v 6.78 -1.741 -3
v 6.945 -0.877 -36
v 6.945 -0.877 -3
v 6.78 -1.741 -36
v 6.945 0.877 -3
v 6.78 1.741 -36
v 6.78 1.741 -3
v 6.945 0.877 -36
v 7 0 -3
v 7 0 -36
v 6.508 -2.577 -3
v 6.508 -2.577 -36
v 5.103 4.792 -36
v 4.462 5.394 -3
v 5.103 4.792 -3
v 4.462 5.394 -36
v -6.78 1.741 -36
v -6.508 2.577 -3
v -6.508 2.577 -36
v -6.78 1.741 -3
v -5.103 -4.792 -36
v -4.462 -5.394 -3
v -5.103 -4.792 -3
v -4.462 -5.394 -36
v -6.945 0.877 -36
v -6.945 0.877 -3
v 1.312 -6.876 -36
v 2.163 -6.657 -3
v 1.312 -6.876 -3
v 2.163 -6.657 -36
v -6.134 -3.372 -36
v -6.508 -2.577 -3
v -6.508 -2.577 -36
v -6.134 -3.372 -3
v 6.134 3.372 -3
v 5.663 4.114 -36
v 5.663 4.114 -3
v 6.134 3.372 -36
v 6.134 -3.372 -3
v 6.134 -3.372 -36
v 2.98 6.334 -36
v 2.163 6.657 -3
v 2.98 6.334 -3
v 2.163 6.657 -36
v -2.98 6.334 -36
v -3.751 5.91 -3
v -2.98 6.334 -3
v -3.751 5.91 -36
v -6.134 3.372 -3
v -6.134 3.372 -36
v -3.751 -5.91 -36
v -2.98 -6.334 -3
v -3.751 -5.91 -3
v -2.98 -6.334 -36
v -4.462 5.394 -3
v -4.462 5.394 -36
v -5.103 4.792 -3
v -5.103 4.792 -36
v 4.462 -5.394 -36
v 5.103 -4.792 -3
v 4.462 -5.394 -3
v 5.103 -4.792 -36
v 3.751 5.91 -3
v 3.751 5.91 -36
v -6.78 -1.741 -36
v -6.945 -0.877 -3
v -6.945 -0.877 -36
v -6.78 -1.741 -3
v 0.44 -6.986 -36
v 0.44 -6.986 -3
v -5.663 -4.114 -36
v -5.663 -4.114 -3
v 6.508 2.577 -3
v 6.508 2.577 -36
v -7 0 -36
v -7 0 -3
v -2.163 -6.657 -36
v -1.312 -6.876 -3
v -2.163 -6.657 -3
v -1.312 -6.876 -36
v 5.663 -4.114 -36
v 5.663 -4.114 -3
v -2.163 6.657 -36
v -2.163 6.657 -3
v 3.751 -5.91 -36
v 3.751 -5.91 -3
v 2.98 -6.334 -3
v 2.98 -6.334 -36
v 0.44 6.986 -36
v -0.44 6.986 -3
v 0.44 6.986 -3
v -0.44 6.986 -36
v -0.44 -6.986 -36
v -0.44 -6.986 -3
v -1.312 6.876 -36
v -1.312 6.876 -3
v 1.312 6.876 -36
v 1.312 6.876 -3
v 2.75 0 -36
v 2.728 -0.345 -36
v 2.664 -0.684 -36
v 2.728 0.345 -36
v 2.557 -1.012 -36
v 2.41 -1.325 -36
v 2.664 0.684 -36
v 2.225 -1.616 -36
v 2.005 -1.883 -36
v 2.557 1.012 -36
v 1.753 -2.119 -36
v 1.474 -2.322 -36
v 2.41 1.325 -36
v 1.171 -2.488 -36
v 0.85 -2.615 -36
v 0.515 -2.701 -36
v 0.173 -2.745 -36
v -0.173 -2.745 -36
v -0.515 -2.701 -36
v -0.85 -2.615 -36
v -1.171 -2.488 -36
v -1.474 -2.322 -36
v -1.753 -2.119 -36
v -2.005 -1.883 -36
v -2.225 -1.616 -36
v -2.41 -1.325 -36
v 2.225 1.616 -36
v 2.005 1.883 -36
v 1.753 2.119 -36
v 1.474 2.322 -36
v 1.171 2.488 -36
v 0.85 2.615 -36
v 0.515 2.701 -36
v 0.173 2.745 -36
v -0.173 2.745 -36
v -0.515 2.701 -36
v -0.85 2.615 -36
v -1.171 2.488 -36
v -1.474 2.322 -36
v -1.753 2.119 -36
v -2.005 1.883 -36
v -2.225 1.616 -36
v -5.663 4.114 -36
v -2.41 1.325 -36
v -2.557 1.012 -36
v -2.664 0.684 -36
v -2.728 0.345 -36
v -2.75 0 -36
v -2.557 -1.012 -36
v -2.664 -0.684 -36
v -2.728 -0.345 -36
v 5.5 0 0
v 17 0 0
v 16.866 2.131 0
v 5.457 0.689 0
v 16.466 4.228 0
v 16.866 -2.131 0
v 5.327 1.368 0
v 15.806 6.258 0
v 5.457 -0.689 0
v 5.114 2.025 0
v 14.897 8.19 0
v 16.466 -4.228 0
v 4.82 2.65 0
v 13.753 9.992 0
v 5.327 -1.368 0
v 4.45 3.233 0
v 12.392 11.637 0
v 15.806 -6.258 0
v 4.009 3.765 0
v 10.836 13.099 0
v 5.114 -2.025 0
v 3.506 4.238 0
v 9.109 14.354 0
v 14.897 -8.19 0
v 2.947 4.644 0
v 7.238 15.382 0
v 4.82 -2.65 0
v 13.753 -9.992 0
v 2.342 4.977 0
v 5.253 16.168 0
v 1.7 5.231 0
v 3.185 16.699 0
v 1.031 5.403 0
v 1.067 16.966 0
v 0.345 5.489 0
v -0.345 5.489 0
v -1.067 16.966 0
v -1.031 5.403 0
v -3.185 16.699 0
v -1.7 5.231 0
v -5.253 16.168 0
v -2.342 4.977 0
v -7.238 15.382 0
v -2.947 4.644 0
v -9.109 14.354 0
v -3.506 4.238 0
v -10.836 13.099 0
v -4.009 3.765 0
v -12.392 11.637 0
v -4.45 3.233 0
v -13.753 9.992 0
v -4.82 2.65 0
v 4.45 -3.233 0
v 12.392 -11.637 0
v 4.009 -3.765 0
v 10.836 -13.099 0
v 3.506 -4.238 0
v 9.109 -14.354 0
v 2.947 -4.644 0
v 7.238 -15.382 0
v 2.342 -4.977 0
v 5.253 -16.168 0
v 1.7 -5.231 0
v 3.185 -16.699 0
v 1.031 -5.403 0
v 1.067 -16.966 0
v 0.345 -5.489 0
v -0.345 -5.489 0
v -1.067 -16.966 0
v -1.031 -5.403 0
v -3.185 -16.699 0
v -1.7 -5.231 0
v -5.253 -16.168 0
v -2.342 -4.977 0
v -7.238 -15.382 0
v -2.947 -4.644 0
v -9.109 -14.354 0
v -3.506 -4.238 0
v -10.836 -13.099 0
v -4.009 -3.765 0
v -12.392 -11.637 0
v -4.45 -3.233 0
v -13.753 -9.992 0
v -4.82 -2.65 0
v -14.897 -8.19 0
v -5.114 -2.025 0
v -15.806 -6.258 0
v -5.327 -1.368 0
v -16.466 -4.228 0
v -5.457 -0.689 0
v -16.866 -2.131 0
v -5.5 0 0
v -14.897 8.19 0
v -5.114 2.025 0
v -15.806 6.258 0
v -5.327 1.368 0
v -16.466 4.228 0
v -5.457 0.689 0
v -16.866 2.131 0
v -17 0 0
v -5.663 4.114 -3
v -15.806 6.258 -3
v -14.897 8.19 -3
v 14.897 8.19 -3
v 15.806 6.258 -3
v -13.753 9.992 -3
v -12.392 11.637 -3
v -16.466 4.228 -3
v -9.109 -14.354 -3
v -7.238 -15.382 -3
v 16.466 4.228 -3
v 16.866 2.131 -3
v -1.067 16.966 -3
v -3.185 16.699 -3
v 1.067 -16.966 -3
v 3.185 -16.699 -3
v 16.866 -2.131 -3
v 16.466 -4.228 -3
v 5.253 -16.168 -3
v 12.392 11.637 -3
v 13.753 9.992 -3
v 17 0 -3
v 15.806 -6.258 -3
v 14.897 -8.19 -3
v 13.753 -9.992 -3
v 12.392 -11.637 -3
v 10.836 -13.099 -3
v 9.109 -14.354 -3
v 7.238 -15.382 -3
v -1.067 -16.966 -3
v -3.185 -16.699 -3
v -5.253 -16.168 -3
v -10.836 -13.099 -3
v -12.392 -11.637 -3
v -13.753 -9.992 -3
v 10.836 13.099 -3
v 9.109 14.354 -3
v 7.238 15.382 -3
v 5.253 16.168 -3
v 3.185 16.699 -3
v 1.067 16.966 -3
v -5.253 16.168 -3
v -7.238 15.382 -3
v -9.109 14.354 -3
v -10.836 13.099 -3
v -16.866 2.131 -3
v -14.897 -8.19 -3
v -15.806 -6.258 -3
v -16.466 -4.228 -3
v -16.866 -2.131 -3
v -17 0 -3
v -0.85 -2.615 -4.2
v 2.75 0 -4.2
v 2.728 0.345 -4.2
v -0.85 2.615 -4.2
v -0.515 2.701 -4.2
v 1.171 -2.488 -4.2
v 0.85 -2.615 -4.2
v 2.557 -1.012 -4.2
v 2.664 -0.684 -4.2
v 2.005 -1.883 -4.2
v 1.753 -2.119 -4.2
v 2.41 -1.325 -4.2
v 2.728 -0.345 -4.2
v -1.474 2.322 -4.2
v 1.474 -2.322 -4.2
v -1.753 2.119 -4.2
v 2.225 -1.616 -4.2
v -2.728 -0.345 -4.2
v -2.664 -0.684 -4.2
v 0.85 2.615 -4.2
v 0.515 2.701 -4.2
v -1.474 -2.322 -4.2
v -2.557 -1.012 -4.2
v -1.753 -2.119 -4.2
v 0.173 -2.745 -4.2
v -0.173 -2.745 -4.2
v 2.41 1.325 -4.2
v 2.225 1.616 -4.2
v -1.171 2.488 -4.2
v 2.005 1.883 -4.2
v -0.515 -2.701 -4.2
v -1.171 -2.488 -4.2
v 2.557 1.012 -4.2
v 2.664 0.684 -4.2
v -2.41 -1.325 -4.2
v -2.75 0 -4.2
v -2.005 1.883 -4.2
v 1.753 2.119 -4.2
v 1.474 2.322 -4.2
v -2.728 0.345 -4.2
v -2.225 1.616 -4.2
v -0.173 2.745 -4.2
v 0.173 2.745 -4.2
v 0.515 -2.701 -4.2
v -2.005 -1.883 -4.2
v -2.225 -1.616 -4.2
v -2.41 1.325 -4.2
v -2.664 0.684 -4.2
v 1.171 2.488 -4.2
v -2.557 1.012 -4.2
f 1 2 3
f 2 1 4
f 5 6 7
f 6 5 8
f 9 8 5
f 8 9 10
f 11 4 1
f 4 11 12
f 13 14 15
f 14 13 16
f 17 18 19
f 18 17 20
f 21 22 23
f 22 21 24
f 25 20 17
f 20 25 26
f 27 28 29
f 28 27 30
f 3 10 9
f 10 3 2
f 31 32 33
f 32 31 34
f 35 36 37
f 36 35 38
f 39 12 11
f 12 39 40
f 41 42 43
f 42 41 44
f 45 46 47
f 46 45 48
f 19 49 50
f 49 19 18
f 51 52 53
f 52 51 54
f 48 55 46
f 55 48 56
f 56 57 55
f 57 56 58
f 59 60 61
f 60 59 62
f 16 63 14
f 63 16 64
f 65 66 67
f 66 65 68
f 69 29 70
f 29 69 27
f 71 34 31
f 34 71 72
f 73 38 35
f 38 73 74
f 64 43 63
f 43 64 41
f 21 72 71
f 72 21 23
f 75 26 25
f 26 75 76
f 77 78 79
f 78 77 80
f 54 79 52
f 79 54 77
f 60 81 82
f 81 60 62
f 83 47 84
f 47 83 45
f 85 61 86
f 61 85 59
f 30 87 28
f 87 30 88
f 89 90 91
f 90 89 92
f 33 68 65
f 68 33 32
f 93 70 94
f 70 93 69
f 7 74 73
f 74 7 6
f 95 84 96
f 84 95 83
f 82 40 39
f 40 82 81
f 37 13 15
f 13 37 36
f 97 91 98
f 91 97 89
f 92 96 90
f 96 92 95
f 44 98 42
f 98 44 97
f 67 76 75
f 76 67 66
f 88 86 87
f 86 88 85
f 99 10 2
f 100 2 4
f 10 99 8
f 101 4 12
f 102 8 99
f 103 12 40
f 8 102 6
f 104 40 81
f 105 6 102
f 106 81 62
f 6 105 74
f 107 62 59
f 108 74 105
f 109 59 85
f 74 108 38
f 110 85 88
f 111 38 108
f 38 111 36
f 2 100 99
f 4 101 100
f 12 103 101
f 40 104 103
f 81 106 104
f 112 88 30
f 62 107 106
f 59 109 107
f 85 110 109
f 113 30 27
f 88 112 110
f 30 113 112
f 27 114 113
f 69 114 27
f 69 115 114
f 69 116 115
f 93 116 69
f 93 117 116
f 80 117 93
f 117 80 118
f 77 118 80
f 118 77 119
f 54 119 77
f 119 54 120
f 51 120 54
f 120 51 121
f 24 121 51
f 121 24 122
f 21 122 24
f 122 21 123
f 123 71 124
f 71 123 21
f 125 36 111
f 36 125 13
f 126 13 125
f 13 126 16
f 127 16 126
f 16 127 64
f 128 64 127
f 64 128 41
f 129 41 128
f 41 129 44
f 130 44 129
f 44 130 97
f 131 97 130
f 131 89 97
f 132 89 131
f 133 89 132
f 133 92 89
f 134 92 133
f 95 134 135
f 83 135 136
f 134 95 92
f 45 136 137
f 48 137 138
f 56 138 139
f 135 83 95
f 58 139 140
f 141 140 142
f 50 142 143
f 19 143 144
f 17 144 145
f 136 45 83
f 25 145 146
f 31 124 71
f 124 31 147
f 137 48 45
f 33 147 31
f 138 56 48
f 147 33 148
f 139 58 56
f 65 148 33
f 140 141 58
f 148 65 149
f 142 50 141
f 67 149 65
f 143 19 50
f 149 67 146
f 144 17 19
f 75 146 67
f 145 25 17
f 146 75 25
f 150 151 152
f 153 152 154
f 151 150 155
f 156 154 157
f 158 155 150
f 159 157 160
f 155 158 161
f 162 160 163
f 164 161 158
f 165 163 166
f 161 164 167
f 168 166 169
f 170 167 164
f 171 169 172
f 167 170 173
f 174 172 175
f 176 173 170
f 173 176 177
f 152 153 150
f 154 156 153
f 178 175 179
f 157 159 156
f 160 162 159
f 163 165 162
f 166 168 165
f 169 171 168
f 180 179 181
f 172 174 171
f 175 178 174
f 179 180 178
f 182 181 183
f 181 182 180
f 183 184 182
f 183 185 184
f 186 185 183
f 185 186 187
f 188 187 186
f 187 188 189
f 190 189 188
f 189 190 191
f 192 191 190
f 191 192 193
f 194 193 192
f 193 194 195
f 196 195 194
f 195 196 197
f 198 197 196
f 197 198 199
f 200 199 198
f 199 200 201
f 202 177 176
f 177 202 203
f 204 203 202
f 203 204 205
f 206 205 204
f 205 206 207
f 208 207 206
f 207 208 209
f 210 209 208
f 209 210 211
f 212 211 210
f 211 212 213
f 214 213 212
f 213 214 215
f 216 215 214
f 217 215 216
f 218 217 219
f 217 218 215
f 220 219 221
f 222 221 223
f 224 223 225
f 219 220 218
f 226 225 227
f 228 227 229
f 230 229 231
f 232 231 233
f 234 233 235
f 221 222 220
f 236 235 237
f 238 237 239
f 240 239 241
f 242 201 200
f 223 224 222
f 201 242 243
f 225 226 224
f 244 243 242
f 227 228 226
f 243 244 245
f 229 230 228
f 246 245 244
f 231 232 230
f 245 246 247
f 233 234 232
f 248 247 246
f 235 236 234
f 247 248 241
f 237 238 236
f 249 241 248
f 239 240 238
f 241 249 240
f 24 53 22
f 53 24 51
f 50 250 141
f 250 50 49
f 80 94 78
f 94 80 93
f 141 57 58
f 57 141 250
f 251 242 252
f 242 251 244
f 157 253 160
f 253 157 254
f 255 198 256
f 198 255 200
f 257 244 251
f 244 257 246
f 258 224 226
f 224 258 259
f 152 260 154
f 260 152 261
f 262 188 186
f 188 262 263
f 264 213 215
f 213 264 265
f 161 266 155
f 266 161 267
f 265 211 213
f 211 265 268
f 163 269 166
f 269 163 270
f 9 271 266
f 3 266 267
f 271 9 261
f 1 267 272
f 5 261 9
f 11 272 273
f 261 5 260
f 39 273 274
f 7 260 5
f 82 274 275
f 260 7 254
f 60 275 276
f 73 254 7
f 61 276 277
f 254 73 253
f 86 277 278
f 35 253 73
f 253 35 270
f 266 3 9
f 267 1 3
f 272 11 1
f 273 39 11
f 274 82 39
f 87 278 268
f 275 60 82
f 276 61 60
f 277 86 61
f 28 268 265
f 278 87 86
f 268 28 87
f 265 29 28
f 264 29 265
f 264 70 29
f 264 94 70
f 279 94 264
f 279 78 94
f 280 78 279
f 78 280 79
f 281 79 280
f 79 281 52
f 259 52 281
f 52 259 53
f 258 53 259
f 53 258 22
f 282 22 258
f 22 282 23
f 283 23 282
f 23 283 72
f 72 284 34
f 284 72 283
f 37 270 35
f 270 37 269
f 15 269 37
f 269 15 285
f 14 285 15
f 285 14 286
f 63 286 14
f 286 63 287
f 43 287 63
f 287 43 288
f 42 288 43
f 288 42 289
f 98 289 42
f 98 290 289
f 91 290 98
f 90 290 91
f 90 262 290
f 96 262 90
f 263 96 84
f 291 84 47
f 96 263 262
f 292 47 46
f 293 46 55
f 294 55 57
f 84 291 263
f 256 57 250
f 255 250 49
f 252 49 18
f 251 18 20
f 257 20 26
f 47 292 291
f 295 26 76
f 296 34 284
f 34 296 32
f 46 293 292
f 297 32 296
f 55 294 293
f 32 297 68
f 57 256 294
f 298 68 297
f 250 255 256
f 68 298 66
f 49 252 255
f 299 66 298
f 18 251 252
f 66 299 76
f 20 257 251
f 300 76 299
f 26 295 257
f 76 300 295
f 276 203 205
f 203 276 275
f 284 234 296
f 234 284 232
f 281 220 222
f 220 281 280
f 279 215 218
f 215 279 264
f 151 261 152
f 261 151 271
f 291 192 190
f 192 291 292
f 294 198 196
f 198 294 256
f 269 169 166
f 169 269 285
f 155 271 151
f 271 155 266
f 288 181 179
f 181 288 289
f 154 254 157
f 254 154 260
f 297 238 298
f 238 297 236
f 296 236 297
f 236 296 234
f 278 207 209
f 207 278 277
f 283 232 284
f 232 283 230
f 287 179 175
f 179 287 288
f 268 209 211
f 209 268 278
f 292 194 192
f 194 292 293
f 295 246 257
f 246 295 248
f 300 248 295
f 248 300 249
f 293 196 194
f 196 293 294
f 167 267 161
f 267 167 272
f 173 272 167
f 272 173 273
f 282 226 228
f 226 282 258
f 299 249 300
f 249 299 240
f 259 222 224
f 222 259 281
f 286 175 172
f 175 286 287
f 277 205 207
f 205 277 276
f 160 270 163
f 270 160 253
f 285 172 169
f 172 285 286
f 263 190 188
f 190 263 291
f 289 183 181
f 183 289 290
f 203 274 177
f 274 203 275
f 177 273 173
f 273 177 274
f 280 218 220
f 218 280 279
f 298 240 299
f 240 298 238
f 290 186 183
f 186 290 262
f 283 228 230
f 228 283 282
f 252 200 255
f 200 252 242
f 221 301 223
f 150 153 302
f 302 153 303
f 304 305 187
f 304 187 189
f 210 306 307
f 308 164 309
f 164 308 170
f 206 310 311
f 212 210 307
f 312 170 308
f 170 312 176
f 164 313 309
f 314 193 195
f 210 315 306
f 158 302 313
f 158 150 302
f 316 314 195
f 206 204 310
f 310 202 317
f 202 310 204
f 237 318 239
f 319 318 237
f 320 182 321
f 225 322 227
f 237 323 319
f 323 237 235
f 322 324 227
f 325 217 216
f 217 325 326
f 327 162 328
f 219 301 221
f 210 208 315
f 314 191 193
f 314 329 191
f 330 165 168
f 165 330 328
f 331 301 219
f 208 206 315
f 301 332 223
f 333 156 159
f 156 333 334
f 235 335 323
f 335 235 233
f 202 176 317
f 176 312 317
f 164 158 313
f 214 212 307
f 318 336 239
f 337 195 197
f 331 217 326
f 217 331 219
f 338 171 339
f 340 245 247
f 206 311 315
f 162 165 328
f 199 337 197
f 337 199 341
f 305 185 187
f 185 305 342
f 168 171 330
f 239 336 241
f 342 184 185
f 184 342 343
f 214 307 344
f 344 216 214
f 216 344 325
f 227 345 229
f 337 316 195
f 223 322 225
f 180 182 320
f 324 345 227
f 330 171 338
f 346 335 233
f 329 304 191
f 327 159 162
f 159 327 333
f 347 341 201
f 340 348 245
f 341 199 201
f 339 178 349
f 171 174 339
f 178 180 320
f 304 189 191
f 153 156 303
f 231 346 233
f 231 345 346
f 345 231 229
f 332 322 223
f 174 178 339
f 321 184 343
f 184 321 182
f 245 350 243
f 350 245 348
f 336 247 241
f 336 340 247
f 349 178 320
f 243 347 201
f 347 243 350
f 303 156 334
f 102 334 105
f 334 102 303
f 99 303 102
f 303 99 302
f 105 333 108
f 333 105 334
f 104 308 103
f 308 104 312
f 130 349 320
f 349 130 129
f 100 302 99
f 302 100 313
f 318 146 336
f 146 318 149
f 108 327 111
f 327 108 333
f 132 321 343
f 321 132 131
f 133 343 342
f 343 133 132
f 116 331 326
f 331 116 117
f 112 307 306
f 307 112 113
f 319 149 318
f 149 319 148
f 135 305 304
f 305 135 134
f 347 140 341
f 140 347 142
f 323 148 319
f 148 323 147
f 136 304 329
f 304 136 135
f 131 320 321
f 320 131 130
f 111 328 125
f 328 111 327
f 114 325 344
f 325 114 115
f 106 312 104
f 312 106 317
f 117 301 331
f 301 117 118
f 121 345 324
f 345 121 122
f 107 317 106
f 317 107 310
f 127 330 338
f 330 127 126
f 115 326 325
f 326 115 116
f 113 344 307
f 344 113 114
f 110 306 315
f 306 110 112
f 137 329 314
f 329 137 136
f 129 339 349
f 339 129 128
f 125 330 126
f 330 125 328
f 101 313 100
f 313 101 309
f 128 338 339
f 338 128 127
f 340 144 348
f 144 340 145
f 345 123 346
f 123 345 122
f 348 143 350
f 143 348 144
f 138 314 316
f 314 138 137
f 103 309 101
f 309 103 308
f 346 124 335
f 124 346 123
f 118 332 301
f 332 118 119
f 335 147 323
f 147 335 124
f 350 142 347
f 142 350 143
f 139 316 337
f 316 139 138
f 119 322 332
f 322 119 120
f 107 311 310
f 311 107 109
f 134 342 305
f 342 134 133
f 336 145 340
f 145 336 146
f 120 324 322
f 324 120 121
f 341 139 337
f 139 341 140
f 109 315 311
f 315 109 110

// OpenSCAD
$fn = 50;


difference() {
	union() {
		translate(v = [0, 0, -36.0000000000]) {
			cylinder(h = 36, r = 7.0000000000);
		}
		translate(v = [0, 0, -3.0000000000]) {
			cylinder(h = 3, r = 17.0000000000);
		}
	}
	union() {
		translate(v = [0, 0, 0]) {
			rotate(a = [0, 0, 0]) {
				difference() {
					union() {
						#translate(v = [0, 0, -36.0000000000]) {
							cylinder(h = 36, r = 2.2500000000);
						}
						#translate(v = [0, 0, -4.2000000000]) {
							cylinder(h = 4.2000000000, r = 7.0000000000, r1 = 2.7500000000, r2 = 5.5000000000);
						}
						#translate(v = [0, 0, -36.0000000000]) {
							cylinder(h = 36, r = 2.7500000000);
						}
						#translate(v = [0, 0, -36.0000000000]) {
							cylinder(h = 36, r = 2.2500000000);
						}
					}
					union();
				}
			}
		}
	}
}
